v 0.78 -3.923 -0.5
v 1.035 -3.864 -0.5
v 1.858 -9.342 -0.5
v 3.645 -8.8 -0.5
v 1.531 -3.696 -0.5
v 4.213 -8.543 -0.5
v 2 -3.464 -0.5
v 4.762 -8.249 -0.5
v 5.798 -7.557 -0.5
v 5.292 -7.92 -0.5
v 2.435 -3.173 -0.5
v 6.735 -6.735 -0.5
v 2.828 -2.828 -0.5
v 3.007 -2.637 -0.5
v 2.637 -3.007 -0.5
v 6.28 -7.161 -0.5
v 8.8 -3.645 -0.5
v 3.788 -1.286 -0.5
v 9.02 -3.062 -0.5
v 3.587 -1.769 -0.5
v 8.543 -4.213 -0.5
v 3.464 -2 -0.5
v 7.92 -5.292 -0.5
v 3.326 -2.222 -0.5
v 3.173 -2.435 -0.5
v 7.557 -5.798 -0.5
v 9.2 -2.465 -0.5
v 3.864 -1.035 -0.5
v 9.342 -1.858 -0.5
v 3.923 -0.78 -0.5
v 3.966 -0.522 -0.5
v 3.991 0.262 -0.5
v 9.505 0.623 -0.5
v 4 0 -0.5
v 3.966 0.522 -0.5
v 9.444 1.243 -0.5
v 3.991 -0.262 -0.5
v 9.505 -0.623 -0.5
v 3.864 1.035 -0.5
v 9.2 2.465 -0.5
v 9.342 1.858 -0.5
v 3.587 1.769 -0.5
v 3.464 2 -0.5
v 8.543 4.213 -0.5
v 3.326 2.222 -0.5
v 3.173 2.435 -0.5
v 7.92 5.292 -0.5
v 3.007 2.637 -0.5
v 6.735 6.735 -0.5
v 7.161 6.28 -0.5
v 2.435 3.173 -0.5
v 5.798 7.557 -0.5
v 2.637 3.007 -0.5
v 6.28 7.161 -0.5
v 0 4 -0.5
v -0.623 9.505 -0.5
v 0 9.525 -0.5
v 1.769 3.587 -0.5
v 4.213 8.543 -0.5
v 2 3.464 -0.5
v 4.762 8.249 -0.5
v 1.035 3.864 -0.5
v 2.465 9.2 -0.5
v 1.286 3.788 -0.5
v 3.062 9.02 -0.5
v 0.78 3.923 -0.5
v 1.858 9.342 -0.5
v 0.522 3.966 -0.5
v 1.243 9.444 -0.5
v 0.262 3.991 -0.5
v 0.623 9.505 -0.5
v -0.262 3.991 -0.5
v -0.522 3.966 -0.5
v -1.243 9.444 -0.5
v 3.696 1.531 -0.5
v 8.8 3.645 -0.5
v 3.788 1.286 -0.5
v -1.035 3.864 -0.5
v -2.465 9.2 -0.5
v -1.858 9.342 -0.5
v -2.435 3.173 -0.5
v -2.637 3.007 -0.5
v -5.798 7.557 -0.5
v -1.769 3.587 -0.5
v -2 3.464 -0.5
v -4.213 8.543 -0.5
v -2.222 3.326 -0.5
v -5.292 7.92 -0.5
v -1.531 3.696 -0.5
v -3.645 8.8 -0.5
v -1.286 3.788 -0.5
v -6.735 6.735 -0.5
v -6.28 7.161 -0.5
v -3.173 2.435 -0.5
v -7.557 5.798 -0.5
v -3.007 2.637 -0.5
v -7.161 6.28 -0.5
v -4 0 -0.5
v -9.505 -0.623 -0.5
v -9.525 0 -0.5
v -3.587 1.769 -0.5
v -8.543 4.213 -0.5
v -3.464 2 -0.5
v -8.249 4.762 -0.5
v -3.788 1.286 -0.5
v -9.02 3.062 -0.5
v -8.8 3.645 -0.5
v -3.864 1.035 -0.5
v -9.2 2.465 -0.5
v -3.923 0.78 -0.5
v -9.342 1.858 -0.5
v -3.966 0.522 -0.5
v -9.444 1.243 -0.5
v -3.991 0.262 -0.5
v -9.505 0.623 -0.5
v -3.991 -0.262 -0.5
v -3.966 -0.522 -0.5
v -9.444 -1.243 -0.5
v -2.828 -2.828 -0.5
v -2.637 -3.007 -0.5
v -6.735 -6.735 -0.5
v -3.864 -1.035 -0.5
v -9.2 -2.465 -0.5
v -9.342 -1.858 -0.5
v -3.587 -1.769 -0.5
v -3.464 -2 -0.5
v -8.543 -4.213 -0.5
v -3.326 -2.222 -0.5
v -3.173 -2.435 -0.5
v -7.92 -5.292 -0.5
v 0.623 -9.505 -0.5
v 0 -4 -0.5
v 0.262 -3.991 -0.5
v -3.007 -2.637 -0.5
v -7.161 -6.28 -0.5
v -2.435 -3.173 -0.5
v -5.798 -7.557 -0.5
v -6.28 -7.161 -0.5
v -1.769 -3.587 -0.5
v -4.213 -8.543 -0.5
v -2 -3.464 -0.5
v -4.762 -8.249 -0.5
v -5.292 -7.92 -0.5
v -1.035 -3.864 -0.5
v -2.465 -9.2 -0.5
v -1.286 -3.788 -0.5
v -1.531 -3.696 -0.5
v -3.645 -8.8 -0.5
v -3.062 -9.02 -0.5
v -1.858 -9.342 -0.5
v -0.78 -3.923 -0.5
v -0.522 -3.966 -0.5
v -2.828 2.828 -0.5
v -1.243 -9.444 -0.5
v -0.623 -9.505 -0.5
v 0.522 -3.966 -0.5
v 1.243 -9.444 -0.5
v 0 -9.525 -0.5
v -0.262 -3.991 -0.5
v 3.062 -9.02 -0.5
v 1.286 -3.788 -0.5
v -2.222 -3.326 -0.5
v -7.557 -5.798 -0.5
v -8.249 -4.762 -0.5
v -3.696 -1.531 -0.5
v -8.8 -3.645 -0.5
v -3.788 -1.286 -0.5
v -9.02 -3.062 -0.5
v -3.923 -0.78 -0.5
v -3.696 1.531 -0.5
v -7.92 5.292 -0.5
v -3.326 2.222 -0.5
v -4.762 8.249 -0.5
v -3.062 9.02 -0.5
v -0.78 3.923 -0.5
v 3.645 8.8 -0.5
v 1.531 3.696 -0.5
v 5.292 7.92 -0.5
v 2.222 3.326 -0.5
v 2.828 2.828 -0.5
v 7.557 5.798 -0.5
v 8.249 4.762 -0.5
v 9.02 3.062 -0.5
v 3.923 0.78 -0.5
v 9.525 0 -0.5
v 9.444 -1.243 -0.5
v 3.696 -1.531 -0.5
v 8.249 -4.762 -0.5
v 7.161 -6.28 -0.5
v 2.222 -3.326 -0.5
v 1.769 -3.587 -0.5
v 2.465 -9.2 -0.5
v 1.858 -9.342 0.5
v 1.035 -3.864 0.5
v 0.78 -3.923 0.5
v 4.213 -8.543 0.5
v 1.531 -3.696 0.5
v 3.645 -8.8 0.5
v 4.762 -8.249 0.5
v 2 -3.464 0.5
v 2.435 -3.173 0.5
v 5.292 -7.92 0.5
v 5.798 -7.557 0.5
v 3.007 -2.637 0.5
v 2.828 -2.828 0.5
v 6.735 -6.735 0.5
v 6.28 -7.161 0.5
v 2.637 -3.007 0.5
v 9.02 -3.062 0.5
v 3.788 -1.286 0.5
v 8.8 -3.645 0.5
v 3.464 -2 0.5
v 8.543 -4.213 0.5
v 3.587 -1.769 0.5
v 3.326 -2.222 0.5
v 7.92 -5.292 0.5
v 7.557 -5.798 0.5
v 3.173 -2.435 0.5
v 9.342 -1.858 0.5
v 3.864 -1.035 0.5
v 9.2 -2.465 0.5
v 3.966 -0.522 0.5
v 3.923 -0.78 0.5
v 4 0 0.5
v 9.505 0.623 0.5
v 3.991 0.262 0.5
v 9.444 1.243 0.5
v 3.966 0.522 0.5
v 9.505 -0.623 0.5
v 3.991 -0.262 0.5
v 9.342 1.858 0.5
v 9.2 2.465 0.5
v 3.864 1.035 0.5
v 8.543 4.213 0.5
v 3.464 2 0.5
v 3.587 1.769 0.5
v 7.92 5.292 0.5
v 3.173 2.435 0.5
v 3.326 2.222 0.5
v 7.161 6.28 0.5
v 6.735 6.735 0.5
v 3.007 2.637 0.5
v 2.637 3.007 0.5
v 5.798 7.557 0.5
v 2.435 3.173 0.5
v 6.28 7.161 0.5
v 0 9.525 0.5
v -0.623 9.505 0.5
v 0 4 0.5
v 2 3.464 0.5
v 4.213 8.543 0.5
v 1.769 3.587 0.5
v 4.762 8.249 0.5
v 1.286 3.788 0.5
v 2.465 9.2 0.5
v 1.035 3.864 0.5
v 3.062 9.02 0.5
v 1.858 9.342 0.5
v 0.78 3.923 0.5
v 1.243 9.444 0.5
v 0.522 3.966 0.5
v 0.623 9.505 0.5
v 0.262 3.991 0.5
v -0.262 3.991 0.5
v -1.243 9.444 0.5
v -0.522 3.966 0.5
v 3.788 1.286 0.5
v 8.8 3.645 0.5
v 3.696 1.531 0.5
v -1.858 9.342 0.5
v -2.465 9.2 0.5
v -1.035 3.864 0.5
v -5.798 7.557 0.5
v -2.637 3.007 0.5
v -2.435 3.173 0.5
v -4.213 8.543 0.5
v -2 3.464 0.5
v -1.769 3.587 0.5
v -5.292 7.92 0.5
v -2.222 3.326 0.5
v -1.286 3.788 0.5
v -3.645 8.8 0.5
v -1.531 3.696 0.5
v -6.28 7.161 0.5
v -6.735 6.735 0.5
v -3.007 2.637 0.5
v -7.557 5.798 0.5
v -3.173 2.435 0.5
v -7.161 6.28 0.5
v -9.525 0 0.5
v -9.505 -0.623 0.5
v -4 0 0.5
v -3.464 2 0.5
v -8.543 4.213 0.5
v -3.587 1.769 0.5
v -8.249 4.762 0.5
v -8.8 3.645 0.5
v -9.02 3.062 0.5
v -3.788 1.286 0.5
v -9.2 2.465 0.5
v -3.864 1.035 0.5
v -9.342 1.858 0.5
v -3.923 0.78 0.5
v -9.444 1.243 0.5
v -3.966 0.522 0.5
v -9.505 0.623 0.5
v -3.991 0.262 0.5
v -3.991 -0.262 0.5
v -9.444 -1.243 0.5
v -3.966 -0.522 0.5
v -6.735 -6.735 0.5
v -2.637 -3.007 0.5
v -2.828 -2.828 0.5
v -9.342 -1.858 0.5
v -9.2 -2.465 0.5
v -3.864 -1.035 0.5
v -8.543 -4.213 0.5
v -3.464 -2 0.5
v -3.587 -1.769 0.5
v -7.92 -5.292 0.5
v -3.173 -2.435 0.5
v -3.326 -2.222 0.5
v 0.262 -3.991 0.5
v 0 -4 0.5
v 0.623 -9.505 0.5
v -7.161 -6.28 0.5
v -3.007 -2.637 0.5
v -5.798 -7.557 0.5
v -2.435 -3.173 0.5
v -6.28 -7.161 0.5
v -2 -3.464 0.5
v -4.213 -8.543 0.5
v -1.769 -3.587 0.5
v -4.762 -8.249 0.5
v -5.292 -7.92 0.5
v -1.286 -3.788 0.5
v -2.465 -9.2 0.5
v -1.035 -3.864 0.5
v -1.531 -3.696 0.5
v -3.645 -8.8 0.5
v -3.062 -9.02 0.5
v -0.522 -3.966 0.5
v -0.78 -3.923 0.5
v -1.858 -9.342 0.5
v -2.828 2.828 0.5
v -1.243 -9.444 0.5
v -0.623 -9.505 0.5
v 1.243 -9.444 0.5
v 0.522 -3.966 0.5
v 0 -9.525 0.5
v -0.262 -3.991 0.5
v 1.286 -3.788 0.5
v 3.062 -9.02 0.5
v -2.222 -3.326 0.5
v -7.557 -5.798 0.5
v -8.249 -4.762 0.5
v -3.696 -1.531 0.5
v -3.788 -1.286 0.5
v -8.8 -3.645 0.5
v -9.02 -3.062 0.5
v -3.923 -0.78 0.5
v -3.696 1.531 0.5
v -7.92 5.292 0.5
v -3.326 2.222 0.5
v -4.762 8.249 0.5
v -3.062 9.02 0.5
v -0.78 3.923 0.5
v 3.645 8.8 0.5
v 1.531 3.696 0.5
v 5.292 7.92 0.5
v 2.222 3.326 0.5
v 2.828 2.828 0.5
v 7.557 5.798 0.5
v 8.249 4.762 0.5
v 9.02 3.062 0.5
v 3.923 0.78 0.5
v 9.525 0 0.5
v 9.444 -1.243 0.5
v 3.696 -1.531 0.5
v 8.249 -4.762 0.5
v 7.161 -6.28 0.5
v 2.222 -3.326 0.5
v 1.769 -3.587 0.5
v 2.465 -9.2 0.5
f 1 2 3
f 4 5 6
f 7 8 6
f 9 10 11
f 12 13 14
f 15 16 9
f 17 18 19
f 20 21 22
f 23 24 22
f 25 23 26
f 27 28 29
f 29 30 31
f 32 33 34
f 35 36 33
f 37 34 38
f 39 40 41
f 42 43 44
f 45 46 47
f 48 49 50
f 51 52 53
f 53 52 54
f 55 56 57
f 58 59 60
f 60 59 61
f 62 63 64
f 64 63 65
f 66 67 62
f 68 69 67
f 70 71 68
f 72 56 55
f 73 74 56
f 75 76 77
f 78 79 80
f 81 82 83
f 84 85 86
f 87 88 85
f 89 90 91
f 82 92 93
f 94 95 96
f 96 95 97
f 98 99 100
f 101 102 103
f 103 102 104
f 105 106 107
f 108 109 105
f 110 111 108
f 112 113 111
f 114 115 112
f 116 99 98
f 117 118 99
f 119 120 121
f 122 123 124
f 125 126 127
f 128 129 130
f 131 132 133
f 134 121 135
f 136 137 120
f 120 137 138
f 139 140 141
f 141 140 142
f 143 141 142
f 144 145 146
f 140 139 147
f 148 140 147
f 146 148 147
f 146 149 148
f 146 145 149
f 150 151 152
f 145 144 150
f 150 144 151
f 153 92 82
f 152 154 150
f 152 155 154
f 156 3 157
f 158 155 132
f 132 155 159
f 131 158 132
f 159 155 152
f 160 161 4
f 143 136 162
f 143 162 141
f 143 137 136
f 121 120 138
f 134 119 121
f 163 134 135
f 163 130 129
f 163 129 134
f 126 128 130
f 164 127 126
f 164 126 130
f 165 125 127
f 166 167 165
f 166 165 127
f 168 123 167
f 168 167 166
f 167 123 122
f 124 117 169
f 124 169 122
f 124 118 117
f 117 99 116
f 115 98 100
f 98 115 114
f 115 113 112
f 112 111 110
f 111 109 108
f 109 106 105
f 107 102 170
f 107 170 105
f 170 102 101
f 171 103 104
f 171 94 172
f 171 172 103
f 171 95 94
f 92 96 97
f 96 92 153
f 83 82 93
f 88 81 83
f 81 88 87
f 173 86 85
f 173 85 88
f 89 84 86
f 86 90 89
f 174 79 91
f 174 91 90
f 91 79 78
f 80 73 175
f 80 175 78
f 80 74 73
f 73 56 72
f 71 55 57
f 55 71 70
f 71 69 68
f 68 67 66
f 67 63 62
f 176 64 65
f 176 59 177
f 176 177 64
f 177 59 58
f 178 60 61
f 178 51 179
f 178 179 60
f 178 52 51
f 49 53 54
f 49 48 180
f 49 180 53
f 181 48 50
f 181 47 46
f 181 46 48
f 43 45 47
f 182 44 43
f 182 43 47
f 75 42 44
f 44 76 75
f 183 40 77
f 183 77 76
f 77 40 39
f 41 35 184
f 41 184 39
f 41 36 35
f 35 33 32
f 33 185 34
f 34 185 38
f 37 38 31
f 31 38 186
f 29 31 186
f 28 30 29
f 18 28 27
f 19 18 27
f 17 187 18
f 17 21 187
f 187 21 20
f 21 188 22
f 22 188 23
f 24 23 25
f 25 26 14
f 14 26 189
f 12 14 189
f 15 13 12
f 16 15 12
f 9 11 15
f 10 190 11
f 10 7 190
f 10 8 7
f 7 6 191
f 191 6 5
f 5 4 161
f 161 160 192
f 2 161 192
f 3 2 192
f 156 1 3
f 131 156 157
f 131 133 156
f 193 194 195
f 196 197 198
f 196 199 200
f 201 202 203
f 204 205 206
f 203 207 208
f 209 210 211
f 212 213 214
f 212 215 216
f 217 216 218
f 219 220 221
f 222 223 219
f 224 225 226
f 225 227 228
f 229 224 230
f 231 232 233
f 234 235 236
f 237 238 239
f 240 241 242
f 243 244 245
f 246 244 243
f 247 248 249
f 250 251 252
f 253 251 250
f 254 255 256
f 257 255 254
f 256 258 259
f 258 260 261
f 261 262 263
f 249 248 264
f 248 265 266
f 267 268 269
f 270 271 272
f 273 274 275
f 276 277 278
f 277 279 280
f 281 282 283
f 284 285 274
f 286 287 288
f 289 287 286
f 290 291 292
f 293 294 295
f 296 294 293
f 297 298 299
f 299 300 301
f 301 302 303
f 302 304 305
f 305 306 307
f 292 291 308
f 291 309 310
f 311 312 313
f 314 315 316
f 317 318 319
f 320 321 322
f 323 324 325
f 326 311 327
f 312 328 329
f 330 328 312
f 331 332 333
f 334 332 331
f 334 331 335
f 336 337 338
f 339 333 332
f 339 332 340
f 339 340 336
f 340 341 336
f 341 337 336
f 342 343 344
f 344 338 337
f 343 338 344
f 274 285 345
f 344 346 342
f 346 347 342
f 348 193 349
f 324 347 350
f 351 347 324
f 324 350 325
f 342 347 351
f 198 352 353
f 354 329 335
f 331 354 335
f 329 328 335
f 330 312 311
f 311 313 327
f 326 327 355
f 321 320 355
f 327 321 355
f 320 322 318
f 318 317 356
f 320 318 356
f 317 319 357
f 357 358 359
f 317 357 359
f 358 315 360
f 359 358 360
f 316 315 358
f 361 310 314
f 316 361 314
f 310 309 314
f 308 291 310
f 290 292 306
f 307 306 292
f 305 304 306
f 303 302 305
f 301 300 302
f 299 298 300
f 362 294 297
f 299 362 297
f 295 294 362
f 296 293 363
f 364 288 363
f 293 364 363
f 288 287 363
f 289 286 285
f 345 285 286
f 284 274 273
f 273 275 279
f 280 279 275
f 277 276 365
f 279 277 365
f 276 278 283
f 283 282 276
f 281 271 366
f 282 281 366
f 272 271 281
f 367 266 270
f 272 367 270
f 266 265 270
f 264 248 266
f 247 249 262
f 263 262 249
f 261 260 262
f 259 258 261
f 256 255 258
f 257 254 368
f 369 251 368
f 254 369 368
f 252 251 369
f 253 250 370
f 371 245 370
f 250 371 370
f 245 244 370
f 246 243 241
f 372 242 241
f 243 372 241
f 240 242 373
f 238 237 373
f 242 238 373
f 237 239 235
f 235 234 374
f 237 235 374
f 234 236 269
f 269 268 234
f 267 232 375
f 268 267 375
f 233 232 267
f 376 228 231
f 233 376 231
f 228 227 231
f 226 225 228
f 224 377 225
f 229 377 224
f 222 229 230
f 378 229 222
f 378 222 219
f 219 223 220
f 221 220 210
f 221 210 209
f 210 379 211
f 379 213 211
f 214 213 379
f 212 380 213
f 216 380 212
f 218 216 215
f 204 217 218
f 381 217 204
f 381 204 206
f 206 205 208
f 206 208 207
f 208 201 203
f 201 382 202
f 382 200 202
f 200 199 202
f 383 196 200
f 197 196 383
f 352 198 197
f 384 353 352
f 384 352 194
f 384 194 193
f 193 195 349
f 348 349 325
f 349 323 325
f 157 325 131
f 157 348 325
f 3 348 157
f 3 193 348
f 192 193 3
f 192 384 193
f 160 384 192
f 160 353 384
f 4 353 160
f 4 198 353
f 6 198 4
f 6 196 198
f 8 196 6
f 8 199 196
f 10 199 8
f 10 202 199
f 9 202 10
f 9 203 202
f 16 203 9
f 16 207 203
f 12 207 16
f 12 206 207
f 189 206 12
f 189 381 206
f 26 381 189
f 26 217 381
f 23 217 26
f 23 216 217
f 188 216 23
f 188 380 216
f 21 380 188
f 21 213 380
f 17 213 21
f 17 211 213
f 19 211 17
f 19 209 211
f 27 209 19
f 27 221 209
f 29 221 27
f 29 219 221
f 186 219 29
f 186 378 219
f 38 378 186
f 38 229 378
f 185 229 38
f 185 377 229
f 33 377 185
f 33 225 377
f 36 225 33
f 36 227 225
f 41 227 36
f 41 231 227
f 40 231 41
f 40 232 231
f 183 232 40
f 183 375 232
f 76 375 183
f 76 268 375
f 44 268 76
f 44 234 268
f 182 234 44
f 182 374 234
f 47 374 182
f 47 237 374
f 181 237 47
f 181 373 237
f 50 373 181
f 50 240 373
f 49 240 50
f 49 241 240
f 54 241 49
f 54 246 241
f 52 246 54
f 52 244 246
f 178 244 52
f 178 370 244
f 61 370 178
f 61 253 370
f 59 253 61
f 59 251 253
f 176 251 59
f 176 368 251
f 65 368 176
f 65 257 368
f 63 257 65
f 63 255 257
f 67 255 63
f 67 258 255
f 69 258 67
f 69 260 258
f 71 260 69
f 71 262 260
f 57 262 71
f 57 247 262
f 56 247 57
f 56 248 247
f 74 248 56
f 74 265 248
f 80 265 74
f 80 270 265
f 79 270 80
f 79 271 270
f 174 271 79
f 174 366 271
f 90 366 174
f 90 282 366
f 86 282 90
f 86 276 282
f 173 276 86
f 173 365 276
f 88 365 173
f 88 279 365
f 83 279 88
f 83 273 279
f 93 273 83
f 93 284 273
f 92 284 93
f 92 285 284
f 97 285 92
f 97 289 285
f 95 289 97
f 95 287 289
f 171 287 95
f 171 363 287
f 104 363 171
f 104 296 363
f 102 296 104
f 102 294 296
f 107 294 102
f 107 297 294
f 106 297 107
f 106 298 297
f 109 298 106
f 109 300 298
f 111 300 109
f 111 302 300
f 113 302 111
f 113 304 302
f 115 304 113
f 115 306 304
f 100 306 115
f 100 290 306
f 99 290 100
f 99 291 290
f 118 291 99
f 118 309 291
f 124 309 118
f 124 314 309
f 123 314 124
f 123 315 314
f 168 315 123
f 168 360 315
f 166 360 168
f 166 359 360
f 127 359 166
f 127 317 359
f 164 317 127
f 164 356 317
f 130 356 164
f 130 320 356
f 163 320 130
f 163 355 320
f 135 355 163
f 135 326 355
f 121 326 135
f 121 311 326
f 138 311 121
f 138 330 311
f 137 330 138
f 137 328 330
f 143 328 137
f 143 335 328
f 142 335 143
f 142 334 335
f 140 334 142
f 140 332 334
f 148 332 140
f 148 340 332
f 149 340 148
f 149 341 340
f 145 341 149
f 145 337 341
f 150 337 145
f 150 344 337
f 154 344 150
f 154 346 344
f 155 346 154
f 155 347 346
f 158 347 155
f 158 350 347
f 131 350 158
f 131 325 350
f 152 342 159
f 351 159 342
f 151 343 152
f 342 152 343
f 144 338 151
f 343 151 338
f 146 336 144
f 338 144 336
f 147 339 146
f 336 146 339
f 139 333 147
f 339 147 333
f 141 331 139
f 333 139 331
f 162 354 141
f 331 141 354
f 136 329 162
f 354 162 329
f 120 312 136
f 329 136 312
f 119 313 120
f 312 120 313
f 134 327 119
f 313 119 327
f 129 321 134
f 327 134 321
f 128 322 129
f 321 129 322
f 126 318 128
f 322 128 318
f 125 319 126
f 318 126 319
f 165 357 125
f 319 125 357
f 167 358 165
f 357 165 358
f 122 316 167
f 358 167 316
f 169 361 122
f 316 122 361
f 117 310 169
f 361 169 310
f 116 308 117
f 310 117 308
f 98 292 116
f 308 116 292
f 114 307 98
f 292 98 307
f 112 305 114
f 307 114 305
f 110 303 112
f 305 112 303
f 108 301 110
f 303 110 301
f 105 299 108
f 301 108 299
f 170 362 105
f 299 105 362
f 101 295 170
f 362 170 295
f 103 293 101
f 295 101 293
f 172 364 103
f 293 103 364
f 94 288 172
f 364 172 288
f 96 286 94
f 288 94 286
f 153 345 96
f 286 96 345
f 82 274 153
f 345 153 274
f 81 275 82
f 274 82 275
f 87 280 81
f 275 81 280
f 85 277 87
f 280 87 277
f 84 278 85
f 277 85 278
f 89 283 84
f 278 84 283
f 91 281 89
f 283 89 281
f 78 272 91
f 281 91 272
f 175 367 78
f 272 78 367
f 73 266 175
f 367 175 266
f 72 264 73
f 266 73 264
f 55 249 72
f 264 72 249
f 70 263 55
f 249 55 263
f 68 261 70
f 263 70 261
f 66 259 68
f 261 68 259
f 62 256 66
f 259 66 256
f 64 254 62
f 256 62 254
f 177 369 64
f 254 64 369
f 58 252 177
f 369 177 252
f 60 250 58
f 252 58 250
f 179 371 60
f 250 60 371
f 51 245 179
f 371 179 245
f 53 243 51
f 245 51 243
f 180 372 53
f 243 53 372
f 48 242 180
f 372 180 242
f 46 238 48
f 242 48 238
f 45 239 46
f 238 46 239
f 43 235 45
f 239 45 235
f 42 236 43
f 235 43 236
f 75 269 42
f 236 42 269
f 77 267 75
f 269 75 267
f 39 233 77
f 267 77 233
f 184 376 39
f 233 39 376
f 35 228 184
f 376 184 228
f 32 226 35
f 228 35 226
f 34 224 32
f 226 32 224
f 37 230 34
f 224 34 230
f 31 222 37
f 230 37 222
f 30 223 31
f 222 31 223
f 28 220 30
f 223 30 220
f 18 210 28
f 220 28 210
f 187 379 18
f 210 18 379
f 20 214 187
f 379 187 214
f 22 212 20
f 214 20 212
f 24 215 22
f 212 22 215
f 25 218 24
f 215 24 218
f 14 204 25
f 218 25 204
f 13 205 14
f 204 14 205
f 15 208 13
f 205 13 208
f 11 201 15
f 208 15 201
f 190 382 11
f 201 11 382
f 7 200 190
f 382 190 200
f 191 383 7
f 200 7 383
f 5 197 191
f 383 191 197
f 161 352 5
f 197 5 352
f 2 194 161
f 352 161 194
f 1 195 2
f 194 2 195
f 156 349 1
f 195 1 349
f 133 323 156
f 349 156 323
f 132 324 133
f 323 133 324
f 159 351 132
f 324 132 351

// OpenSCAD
// file: ../lib/TOGArrayLib1.scad
// TOGArrayLib1.4
// 
// Functions for working with arrays.
// 
// v1.1:
// - tal1_reduce assert(is_list(items)) to prevent infinite recursion
//   when given undefined or other non-list values
// v1.1.1:
// - Fix tal1_uniq_remap_v2 to return "list-remap-result" as the
//   first element of the returned list
// v1.2:
// - Add tal1_replace_at function
// v1.3:
// - tal1_is_vec_of, tal1_is_vec_of_num
// v1.4:
// - tal1_assert_for_each, for when you want to assert something
//   about each of a list of items and get nice failure messages

/**
 * Make a list with the contents of list `a`,
 * but starting at offset `off`, replaced by the contents of list `b`.
 * len(result) = max(len(a), off+len(b))
 */
function tal1_replace_at(a, off, b, default_value=undef, default_value_function=undef) =
	assert(is_list(a))
	assert(is_list(b))
	let( _dvf = !is_undef(default_value_function) ? default_value_function : function(i) default_value )
[
	for( i=[0:1:min(off,len(a))-1] ) a[i],
	for( i=[len(a):1:off-1] ) _dvf(i),
	for( i=[off:1:off+len(b)-1] ) b[i-off],
	for( i=[off+len(b):1:len(a)-1] ) a[i],
];

// Simplest case
assert([] == tal1_replace_at([], 0, []));
// Second simplest cases
assert(["foo"] == tal1_replace_at(["foo"], 0, []));
assert(["foo"] == tal1_replace_at([], 0, ["foo"]));
// Replace one item
assert(["foo","quux","baz"] == tal1_replace_at(["foo","bar","baz"], 1, ["quux"]));
// Replace and extend
assert(["foo","quux","tuna","tina"] == tal1_replace_at(["foo","bar","baz"], 1, ["quux", "tuna", "tina"]));
// Add beyond end of `a`
assert(["foo","zzz","quux"] == tal1_replace_at(["foo"], 2, ["quux"], default_value="zzz"));
// Adding 'nothing' should still fill to that point with defaults
assert(["foo","zzz","zzz"] == tal1_replace_at(["foo"], 3, [], default_value="zzz"));


function tal1_reduce(start, items, func, offset=0) =
	assert(is_list(items))
	len(items) == offset ? start :
	tal1_reduce(func(start, items[offset]), items, func, offset+1);

function tal1_consecutive_duplicate_count(items) = tal1_reduce(
	[0, undef],
	items,
	function(z,item) [z[0] + (item == z[1] ? 1 : 0), item]
)[0];

assert(0 == tal1_consecutive_duplicate_count([]));
assert(0 == tal1_consecutive_duplicate_count([50]));
assert(1 == tal1_consecutive_duplicate_count([50,50]));
assert(0 == tal1_consecutive_duplicate_count([50,51,52,53]));
assert(1 == tal1_consecutive_duplicate_count([50,51,52,52]));
assert(3 == tal1_consecutive_duplicate_count([50,50,50,50]));

// Set test_size to arbirarily large values
// to ensure that OpenSCAD can handle heavy recursion
let(test_size=1000) assert(test_size/2 == tal1_consecutive_duplicate_count([for(i=[0:1:test_size-1]) floor(i/2)]));



function tal1_uniq_(items, off0, off1) =
	let(chunklen = off1-off0)
	chunklen == 0 ? [] :
	chunklen == 1 ? [items[off0]] :
	let(half=floor(chunklen/2))
	let(left  = tal1_uniq_(items, off0     , off0+half))
	let(right = tal1_uniq_(items, off0+half, off1     ))
	assert(len(left) > 0)
	assert(len(right) > 0)
	left[len(left)-1] == right[0] ? [each left, for(i=[1:1:len(right)-1]) right[i]] :
	[each left, each right];

/** Given a list of items, returns a new list with identical consecutive items merged */
function tal1_uniq(items) = tal1_uniq_(items, 0, len(items));

assert([] == tal1_uniq([]));
assert([123] == tal1_uniq([123]));
assert([55,0,1,2,3] == tal1_uniq([55,0,1,2,3]));
assert([55,0,1,2] == tal1_uniq([55,0,1,1,2]));
assert([55,0,1] == tal1_uniq([55,55,0,0,0,0,0,0,1,1,1,1]));
assert([55,0] == tal1_uniq([55,0,0,0,0,0,0,0]));



/**
 * Returns [new items, old index -> new index mapping].
 * No-op version.
 */
function tal1_uniq_remap_v1(items) =
	["list-remap-result", items, [for (vi=[0:1:len(items)-1]) vi]];

// [a, a, b, b, c, c]
//
// [a,    ...], []  -> [a],[0]
// [a, a, ...], [0] -> [a],[0,0]

assert([1,2,3] == [1,2,3]);

/**
 * Recursive version that will combine adjacent identical vertexes,
 * but will use the original items.
 */
function tal1_uniq_remap_v2(items, map=[]) =
	let(index = len(map))
	len(items) == index ? ["list-remap-result", items, map] :
	index == 0 ? tal1_uniq_remap_v2(items, [0]) :
	items[index] == items[map[index-1]] ? tal1_uniq_remap_v2(items, [for(vi=map) vi, map[index-1]]) :
	tal1_uniq_remap_v2(items, [for(vi=map) vi, index]);

assert(tal1_uniq_remap_v2([1,1,2,2,3,4]) == ["list-remap-result", [1,1,2,2,3,4], [0,0,2,2,4,5]]);


/**
 * Returns true if `vec` is a list of at least min_len items
 * and component_check(each item, even those beyond min_len) is true.
 */
function tal1_is_vec_of(vec, min_len=0, component_check=function(x) true) =
	assert(is_num(min_len) && min_len >= 0)
	assert(is_function(component_check))
	is_list(vec) && len(vec) >= min_len &&
	tal1_reduce(true, vec, function(prev,item) prev && component_check(item));

function tal1_is_vec_of_num(vec, min_len=0) = tal1_is_vec_of(vec, min_len, function(i) is_num(i));

assert( true == tal1_is_vec_of_num([1,2,3]));
assert( true == tal1_is_vec_of_num([]));
assert( true == tal1_is_vec_of_num([1,2,3], 3));
assert(false == tal1_is_vec_of_num([1,2], 3));
assert(false == tal1_is_vec_of_num([1,2,"spoon"], 3));
// Requirements are ambiguous when
// first min_len items are numbers, but there are non-numeric items afterwards,
// so let's error on the side of saying 'no, it's not a list of numbers';
// i.e. the item check and the min_len are independent.
assert(false == tal1_is_vec_of_num([1,2,3,"artichoke"], 3));


/**
 * Asserts that item_checker(each item in list, index of item)[0] is true.
 * Second element of item_checker return value is assertion message.
 * Returns the original list, in case that's useful to you.
 */
function tal1_assert_for_each(list, item_checker) =
	let( _ignored = [ for(i=[0:1:len(list)-1])
		let(q=item_checker(list[i],i))
		let(passed=is_bool(q) ? q : is_list(q) ? q[0] : assert(false, str(
			"tal1_assert_for_each: item_checker should return Bool|[Bool,String], but returned ",
			q, " for item at index ", i)))
		let(message=is_list(q) ? q[1] : undef)
		assert(passed, message)
		q
	])
	list;

// Callback can return a boolean...
assert([1,2,3] == tal1_assert_for_each([1,2,3], function(v,i) is_num(v)));
// ...or a [boolean, string]
assert([1,2,3] == tal1_assert_for_each([1,2,3], function(v,i) [is_num(v), "element be a num"]));
// file: ../lib/TOGMod1Constructors.scad
// TOGMod1Constructors-v1.8
// 
// Functions to construct objects understood by TOGMod1
// 
// v1.1:
// - Add togmod1_make_rounded_rect
// v1.2:
// - togmod1_make_rounded_rect can make ovals
// v1.3:
// - togmod1_circle_points, to just get the points of a circle
// - if pos parameter to circle function has a third element,
//   returned vertexes will include it as the z component;
// v1.3.1
// - Some assertions
// v1.4:
// - Refactor togmod1_rounded_rect_points and togmod1_circle_points
//   to use togmod1__make_nd_vector_adder for adapting to whatever
//   `pos` parameter is.
// v1.5:
// - togmod_rounded_rect_points will not simplify completely rounded sides
//   (where length of side is exactly twice the rounding radius)
//   unless simplify_rounded_sides=true
//   - This makes it more useful for polyhedron generation,
//     where radius varies, but number of points must remain constant.
// v1.6:
// - togmod1_make_rect makes a simple rectangle
// - togmod1_make_rounded_rect will defer to togmod1_make_rect when r=0
// v1.7:
// - togmod1_make_circle will return empty shape (["union"]) when d=0
// v1.8:
// - Add togmod1_text

use <./TOGArrayLib1.scad>

function togmod1__make_nd_vector_adder(origin=[0,0]) =
	let(origin_is_zero = tal1_reduce(true, origin, function(prev,item) prev && item == 0))
	origin_is_zero ? (function(vec) len(vec) >= len(origin) ? vec : tal1_replace_at(origin, 0, vec)) :
	function(vec) [
		for(i=[0:1:max(len(origin),len(vec))-1]) (len(vec) > i ? vec[i] : 0) + (len(origin) > i ? origin[i] : 0),
	];

assert([1,2,3] == togmod1__make_nd_vector_adder()([1,2,3]));
echo(togmod1__make_nd_vector_adder([0,0,3])([1,2]));
assert([1,2,3] == togmod1__make_nd_vector_adder([0,0,3])([1,2]));


function togmod1_make_cuboid(size) =
	assert(is_list(size))
	assert(len(size) >= 3)
	assert(is_num(size[0]))
	assert(is_num(size[1]))
	assert(is_num(size[2]))
	["polyhedron-vf", [
		[-size[0]/2, -size[1]/2, -size[2]/2],
		[+size[0]/2, -size[1]/2, -size[2]/2],
		[-size[0]/2, +size[1]/2, -size[2]/2],
		[+size[0]/2, +size[1]/2, -size[2]/2],
		[-size[0]/2, -size[1]/2, +size[2]/2],
		[+size[0]/2, -size[1]/2, +size[2]/2],
		[-size[0]/2, +size[1]/2, +size[2]/2],
		[+size[0]/2, +size[1]/2, +size[2]/2]
	], [
		[0,1,3,2],[0,4,5,1],[4,6,7,5],[3,7,6,2],[1,5,7,3],[6,4,0,2]
	]];

function togmod1_make_polygon(verts) =
	["polygon-vp", verts, [[for( i=[0:1:len(verts)-1] ) i%len(verts)]]];

function togmod1_rounded_rect_points(size, r, pos=[0,0], simplify_rounded_sides=false) =
	assert(is_list(size))
	assert(len(size) >= 2)
	let(radii = is_list(r) ? r : is_num(r) ? [r,r] : assert(false, "rounded_rect r(adius) should be list<num> or num"))
	let(rx = radii[0])
	let(ry = radii[1])
	assert(is_num(rx))
	assert(is_num(ry))
	assert(size[0] >= 2*rx, str("size[0] must be >= 2*r[0]; size[0] = ",size[0],", 2*r[0] = ",2*rx))
	assert(size[1] >= 2*ry, str("size[1] must be >= 2*r[1]; size[1] = ",size[1],", 2*r[1] = ",2*ry))
	let(quarterfn=max($fn/4, 1))
	let(qfnx = simplify_rounded_sides && size[0] == 2*rx ? quarterfn-1 : quarterfn)
	let(qfny = simplify_rounded_sides && size[1] == 2*ry ? quarterfn-1 : quarterfn)
	let(finalizepos = togmod1__make_nd_vector_adder(pos))
[
	for(a=[0 : 1 : qfnx]) let(ang=      a*90/quarterfn) finalizepos([ size[0]/2-rx + rx*cos(ang),  size[1]/2-ry + ry*sin(ang)]),
	for(a=[0 : 1 : qfny]) let(ang= 90 + a*90/quarterfn) finalizepos([-size[0]/2+rx + rx*cos(ang),  size[1]/2-ry + ry*sin(ang)]),
	for(a=[0 : 1 : qfnx]) let(ang=180 + a*90/quarterfn) finalizepos([-size[0]/2+rx + rx*cos(ang), -size[1]/2+ry + ry*sin(ang)]),
	for(a=[0 : 1 : qfny]) let(ang=270 + a*90/quarterfn) finalizepos([ size[0]/2-rx + rx*cos(ang), -size[1]/2+ry + ry*sin(ang)]),
];

function togmod1_make_rect(size) =
	togmod1_make_polygon([
		[-size[0]/2, -size[1]/2],
		[+size[0]/2, -size[1]/2],
		[+size[0]/2, +size[1]/2],
		[-size[0]/2, +size[1]/2],
	]);

function togmod1_make_rounded_rect(size, r) =
	r == 0 ? togmod1_make_rect(size) :
	togmod1_make_polygon(togmod1_rounded_rect_points(size,r,simplify_rounded_sides=true));

function togmod1_circle_points(r, pos=[0,0], d=undef) =
	assert( !is_undef(r) || !is_undef(d) )
	assert(!is_undef(pos[0]))
	assert(!is_undef(pos[1]))
	let(finalizepos = togmod1__make_nd_vector_adder(pos))
	let(r_ = !is_undef(r) ? r : d/2)
	let(fn = max($fn, 6))
	[for(i=[0 : 1 : fn-1]) finalizepos([r_*cos(i*360/fn), r_*sin(i*360/fn)])];

function togmod1_make_circle(r, pos=[0,0], d=undef) =
	r == 0 || d == 0 ? ["union"] :
	togmod1_make_polygon(togmod1_circle_points(r=r, pos=pos, d=d));

function togmod1_make_cylinder(d, zrange=[0,1], r=undef, pos=[0,0]) =
	assert( !is_undef(r) || !is_undef(d) )
	let( r_ = !is_undef(r) ? r : d/2 )
	// TODO: Make polyhedron directly
	["linear-extrude-zs", zrange, togmod1_make_circle(r=r_, pos=pos)];

function togmod1__is_range1d(range) = is_list(range) && len(range) == 2 && is_num(range[0]) && is_num(range[1]);

function togmod1_linear_extrude_z(range, shape) =
	assert(togmod1__is_range1d(range))
	["linear-extrude-zs", range, shape];
function togmod1_linear_extrude_x(range, shape) =
	assert(togmod1__is_range1d(range))
	["rotate", [90, 0, 90], togmod1_linear_extrude_z(range, shape)];
function togmod1_linear_extrude_y(range, shape) =
	assert(togmod1__is_range1d(range))
	["rotate", [90, 0, 180], togmod1_linear_extrude_z(range, shape)];

function togmod1_text(text, size, font, halign, valign, spacing, direction, language, script) =
	["text-tsfhvsdls", text, size, font, halign, valign, spacing, direction, language, script];
// file: ../lib/TOGMod1.scad
// TOGMod1.9
// OpenSCAD library for representing shapes
// 
// See also: Functional OpenSCAD (https://github.com/thehans/FunctionalOpenSCAD)
// 
// v1.8:
// - Add `text-tsfhvsdls`
// v1.9
// - Add `offset-ds` (offset with _d_elta a _s_hape)

module togmod1_domodule(mod) {
	assert(is_list(mod));
	assert(len(mod) > 0);
	if( mod[0] == "polygon-vp" ) {
		// ["polygon-vp", vertexes, paths]
		polygon(points=mod[1], paths=mod[2]);
	} else if( mod[0] == "polyhedron-vf" ) {
		polyhedron(mod[1], faces=mod[2]);
	} else if( mod[0] == "scale" ) {
		assert(len(mod) == 3);
		scale(mod[1]) togmod1_domodule(mod[2]);
	} else if( mod[0] == "translate" ) {
		assert(len(mod) == 3);
		assert(is_list(mod[1]));
		for(c=mod[1]) assert(is_num(c), "translate component should be numeric");
		translate(mod[1]) togmod1_domodule(mod[2]);
	} else if( mod[0] == "rotate" || mod[0] == "rotate-xyz" ) {
		// Note that ["rotate", [x,y,z], shape] actually rotates around x, then y, then z.
		// It does *not* rotate around [x,y,z]!  That would require a different form.
		assert(len(mod) == 3);
		rotate(mod[1]) togmod1_domodule(mod[2]);
	} else if( mod[0] == "intersection" ) {
		intersection_for( i=[1:1:len(mod)-1] ) togmod1_domodule(mod[i]);
	} else if( mod[0] == "difference" ) {
		difference() {
			togmod1_domodule(mod[1]);
			for( i=[2:1:len(mod)-1] ) togmod1_domodule(mod[i]);
		}
	} else if( mod[0] == "union" ) {
		for( i=[1:1:len(mod)-1] ) togmod1_domodule(mod[i]);
	} else if( mod[0] == "hull" ) {
		hull() for( i=[1:1:len(mod)-1] ) togmod1_domodule(mod[i]);
	} else if( mod[0] == "offset-rs" ) {
		assert(len(mod) == 3);
		assert(is_num(mod[1]));
		assert(is_list(mod[2]));
		offset(mod[1]) togmod1_domodule(mod[2]);
	} else if( mod[0] == "linear-extrude-zs" ) {
		// ["linear-extrude-zs", [z0,z1], 2d_shape] // centered
		// ["linear-extrude-zs", height, 2d_shape]
		let( zrange = is_list(mod[1]) ? mod[1] : [-mod[1]/2, mod[1]/2] ) {
			translate([0,0,zrange[0]]) linear_extrude(zrange[1]-zrange[0]) togmod1_domodule(mod[2]);
		}
	} else if( mod[0] == "render" ) {
		render() togmod1_domodule(mod[1]);
	} else if( mod[0] == "minkowski" ) {
		minkowski() {
			togmod1_domodule(mod[1]);
			togmod1_domodule(mod[2]);
		}
	} else if( mod[0] == "x-debug" ) {
		# togmod1_domodule(mod[1]);
	} else if( mod[0] == "x-color" ) {
		color(mod[1]) togmod1_domodule(mod[2]);
	} else if( mod[0] == "text-tsfhvsdls" ) {
		text(text=mod[1], size=mod[2], font=mod[3], halign=mod[4], valign=mod[5], spacing=mod[6], direction=mod[7], language=mod[7], script=mod[8]);
	} else if( mod[0] == "offset-ds" ) {
		assert(is_num(mod[1]));
		assert(is_list(mod[2]));
		offset(delta=mod[1]) togmod1_domodule(mod[2]);
	} else {
		assert(false, str("Unrecognized shape: ", mod[0]));
	}
}
// main file
// Washer1.0
//
// A very simple washer.

thickness      =  1.00; // 0.01
outer_diameter = 19.05; // 0.01
inner_diameter =  8.00; // 0.01
$fn = 96;

use <../lib/TOGMod1.scad>
use <../lib/TOGMod1Constructors.scad>

togmod1_domodule(togmod1_linear_extrude_z([-thickness/2,thickness/2], ["difference",
	togmod1_make_circle(d=outer_diameter),
	togmod1_make_circle(d=inner_diameter),
]));
